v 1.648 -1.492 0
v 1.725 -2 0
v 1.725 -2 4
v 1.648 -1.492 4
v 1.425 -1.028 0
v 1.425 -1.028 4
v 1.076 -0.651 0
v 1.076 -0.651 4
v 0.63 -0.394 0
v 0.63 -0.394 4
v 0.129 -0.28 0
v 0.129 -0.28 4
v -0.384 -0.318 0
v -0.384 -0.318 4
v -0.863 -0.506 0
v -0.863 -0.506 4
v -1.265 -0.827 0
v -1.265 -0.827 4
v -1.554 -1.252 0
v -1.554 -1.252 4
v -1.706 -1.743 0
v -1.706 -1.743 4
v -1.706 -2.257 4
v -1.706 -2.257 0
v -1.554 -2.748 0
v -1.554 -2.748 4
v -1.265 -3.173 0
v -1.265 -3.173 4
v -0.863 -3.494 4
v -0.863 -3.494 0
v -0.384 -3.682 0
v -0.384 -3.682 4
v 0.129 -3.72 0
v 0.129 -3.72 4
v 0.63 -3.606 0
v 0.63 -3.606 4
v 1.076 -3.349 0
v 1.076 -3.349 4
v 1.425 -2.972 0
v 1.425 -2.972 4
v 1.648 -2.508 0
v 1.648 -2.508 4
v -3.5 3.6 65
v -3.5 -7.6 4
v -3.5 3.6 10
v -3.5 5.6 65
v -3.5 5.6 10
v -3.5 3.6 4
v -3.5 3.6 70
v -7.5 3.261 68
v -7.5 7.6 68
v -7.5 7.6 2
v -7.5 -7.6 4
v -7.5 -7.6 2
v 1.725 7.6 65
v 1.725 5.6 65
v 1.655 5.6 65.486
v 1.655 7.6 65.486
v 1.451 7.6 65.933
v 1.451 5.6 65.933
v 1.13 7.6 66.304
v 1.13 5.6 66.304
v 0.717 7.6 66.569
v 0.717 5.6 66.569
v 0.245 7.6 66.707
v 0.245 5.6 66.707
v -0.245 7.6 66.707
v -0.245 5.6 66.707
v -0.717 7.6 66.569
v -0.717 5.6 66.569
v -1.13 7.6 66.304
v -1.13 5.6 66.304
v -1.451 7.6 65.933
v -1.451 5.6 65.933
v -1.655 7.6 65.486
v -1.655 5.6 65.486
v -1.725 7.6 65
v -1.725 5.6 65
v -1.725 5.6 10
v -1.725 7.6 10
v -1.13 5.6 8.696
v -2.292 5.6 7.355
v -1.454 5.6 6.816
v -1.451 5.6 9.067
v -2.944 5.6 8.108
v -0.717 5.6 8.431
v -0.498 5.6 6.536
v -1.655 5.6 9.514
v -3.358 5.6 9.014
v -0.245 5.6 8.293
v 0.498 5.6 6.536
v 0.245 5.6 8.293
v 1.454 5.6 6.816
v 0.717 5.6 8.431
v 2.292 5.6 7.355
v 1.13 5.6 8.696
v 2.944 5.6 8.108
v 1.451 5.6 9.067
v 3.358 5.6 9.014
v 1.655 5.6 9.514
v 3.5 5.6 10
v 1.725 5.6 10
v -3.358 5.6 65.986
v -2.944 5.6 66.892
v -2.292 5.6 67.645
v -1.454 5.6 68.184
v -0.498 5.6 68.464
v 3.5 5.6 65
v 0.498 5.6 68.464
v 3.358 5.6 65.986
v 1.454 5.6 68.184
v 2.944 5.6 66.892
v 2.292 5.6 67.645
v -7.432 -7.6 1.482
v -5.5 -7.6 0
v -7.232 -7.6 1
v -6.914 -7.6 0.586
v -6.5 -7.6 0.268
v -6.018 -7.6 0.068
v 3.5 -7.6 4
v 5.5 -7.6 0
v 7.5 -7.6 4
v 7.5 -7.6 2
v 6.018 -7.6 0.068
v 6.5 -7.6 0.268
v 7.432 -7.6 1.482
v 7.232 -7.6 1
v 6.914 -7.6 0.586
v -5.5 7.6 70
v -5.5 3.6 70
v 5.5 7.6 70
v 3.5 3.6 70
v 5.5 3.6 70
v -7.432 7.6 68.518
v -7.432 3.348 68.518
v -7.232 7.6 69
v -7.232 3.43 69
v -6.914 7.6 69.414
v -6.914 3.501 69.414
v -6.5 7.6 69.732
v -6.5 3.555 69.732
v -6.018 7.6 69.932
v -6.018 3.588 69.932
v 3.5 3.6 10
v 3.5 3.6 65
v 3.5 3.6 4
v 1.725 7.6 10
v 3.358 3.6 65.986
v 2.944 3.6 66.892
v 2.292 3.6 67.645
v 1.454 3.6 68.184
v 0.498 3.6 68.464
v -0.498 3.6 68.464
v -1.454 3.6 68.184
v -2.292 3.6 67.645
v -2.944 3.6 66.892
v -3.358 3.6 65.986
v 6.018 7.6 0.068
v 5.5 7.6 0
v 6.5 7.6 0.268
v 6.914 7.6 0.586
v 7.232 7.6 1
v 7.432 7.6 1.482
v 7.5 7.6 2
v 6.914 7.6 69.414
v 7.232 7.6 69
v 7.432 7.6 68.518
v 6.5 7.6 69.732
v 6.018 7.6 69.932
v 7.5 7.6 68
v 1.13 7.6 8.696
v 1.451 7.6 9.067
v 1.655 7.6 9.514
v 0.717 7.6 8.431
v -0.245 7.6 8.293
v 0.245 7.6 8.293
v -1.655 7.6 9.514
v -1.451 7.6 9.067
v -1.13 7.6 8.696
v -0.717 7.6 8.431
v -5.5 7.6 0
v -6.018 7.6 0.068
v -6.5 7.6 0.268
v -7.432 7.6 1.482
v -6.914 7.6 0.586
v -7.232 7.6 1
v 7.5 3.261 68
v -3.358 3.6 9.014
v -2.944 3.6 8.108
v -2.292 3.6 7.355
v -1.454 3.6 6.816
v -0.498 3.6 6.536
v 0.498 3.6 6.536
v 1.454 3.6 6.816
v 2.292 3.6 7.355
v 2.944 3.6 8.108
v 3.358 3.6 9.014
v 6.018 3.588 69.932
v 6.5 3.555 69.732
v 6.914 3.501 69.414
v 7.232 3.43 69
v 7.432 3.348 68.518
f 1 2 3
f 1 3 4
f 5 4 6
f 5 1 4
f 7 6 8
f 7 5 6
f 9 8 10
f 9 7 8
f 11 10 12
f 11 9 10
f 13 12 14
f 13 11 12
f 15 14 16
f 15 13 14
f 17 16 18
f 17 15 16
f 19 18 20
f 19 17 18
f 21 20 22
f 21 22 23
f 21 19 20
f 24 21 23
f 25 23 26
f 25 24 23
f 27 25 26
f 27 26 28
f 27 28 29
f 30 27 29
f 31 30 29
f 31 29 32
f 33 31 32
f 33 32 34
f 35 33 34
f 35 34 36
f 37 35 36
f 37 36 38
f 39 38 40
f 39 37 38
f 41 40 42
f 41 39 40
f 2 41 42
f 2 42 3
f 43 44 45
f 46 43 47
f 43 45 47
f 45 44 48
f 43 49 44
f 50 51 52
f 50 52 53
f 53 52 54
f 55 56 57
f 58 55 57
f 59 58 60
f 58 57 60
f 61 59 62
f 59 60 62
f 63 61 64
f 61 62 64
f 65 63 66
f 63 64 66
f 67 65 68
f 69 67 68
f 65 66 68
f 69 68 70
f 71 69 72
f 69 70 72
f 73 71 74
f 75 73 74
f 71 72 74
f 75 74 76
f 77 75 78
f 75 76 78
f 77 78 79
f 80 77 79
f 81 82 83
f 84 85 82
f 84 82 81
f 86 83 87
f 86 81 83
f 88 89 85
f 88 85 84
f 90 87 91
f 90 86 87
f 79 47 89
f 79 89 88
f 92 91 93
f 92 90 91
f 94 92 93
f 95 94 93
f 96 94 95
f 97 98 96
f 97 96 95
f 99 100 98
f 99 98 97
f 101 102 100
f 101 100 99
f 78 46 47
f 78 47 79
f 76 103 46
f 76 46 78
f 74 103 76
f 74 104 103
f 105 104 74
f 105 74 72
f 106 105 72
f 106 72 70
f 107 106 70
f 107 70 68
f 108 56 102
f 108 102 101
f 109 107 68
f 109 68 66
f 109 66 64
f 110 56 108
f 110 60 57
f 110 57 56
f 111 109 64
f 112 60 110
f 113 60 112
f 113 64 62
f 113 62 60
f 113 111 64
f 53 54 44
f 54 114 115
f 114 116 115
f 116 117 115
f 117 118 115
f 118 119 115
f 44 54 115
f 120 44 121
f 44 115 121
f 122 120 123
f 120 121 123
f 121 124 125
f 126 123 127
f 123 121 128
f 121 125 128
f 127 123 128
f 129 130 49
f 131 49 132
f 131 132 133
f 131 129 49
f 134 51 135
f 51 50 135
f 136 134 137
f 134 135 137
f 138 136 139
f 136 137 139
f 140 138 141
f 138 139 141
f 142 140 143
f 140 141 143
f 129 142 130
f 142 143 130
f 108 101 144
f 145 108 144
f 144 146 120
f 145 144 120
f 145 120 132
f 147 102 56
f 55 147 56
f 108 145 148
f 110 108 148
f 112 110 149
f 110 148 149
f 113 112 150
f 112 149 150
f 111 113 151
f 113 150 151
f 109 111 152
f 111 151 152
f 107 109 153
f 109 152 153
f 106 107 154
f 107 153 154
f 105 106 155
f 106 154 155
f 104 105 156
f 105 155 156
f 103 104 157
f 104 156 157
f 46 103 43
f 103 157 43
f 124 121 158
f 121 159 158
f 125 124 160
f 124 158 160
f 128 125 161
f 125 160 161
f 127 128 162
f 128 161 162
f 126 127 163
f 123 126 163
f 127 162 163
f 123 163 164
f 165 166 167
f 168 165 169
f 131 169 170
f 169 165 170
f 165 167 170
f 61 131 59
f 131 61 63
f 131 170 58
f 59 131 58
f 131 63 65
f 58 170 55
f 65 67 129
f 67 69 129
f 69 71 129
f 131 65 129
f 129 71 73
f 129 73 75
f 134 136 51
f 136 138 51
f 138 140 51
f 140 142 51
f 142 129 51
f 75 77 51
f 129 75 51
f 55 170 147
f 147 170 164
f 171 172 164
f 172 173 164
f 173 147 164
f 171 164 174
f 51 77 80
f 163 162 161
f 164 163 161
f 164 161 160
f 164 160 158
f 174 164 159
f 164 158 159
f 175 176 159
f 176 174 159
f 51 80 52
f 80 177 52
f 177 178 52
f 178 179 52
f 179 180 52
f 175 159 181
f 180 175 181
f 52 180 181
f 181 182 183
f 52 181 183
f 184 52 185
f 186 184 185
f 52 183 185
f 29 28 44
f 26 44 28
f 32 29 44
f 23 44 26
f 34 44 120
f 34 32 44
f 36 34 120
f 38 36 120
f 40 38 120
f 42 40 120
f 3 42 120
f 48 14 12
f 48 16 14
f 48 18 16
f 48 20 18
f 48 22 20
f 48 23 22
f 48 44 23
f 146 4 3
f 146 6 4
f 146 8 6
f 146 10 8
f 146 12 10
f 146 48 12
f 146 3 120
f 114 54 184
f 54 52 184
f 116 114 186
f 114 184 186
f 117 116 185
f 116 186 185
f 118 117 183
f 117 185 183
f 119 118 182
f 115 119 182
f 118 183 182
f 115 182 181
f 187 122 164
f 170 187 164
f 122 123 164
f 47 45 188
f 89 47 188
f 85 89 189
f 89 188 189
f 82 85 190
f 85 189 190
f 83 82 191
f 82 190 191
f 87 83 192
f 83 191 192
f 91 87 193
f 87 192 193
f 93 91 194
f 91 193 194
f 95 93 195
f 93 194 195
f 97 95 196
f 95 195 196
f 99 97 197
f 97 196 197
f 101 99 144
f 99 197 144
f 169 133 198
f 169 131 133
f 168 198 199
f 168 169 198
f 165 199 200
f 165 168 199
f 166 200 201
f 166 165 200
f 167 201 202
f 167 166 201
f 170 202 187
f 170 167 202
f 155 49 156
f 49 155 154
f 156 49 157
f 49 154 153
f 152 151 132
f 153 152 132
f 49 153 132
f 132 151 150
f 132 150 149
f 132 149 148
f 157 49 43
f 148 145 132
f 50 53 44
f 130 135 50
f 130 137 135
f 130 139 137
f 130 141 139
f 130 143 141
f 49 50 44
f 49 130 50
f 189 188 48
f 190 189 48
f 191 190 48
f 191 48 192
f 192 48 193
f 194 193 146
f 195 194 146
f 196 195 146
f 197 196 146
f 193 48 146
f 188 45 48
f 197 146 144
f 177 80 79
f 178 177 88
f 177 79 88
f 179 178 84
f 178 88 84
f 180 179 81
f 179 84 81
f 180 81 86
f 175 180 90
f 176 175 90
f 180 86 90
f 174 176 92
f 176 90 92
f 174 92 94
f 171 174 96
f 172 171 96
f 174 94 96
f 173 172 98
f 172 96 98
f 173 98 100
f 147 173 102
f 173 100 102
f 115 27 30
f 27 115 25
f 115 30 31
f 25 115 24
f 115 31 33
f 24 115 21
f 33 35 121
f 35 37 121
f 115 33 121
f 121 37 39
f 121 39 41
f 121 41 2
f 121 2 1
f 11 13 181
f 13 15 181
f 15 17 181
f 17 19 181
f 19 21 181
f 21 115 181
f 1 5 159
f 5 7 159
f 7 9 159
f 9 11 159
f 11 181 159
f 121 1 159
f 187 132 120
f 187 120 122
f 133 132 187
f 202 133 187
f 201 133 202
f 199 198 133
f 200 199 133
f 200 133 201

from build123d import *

# Parameters (mm, degrees)
F0_W     = 15
F0_H     = 15.2
F0_R     = 1.725
F1_DEPTH = 4
F3_DEPTH = 66
F5_DEPTH = 2
F6_DEPTH = 4
F7_SIZE2 = 11.2
F7_SIZE  = 66
F8_R     = 2


with BuildPart() as f1:
    # F0 (on Top) → F1 (new body)
    with BuildSketch(Plane.XY):
        Rectangle(F0_W, F0_H)
        with Locations((0, -2)):
            Circle(F0_R, mode=Mode.SUBTRACT)
    extrude(amount=F1_DEPTH)

    # F2 (on face) → F3 (join)
    with BuildSketch(Plane.XY.offset(4)):
        Polygon((-7.5, 7.6), (-7.5, -7.6), (-3.5, -7.6), (-3.5, -2), (-3.5, 3.6), (3.5, 3.6), (3.5, -2), (3.5, -7.6), (7.5, -7.6), (7.5, 7.6), align=None)
    extrude(amount=F3_DEPTH)

    # F4 (on face) → F5 (cut)
    with BuildSketch(Plane.XZ.offset(-3.6)):
        with BuildLine():
            Line((-1.725, 13.045385854), (-1.725, 61.954614146))
            ThreePointArc((-1.725, 61.954614146), (-3.0238634228, 63.2375443268), (-3.5, 65))
            Line((-3.5, 65), (-3.5, 10.0000000135))
            ThreePointArc((-3.5, 10.0000000135), (-3.0238634194, 11.762455679), (-1.725, 13.045385854))
        make_face()
        with BuildLine():
            ThreePointArc((3.5, 65), (3.0238634228, 63.2375443268), (1.725, 61.954614146))
            Line((1.725, 61.954614146), (1.725, 13.045385854))
            ThreePointArc((1.725, 13.045385854), (3.0238634228, 11.7624556732), (3.5, 10))
            Line((3.5, 10), (3.5, 65))
        make_face()
        with BuildLine():
            ThreePointArc((-1.725, 65), (0, 66.725), (1.725, 65))
            Line((1.725, 65), (1.725, 61.954614146))
            ThreePointArc((1.725, 61.954614146), (3.0238634228, 63.2375443268), (3.5, 65))
            ThreePointArc((3.5, 65), (0, 68.5), (-3.5, 65))
            ThreePointArc((-3.5, 65), (-3.0238634228, 63.2375443268), (-1.725, 61.954614146))
            Line((-1.725, 61.954614146), (-1.725, 65))
        make_face()
        with BuildLine():
            ThreePointArc((3.5, 10), (3.0238634228, 11.7624556732), (1.725, 13.045385854))
            Line((1.725, 13.045385854), (1.725, 10))
            ThreePointArc((1.725, 10), (0, 8.275), (-1.725, 10))
            Line((-1.725, 10), (-1.725, 13.045385854))
            ThreePointArc((-1.725, 13.045385854), (-3.0238634194, 11.762455679), (-3.5, 10.0000000135))
            ThreePointArc((-3.5, 10.0000000135), (-6.7e-09, 6.5), (3.5, 10))
        make_face()
    extrude(amount=-F5_DEPTH, mode=Mode.SUBTRACT)

    # F4 (on face) → F6 (cut, through all)
    with BuildSketch(Plane.XZ.offset(-3.6)):
        with BuildLine():
            ThreePointArc((-1.725, 65), (0, 63.275), (1.725, 65))
            ThreePointArc((1.725, 65), (0, 66.725), (-1.725, 65))
        make_face()
        with BuildLine():
            Line((1.725, 61.954614146), (1.725, 65))
            ThreePointArc((1.725, 65), (0, 63.275), (-1.725, 65))
            Line((-1.725, 65), (-1.725, 61.954614146))
            ThreePointArc((-1.725, 61.954614146), (0, 61.5), (1.725, 61.954614146))
        make_face()
        with BuildLine():
            Line((1.725, 13.045385854), (1.725, 61.954614146))
            ThreePointArc((1.725, 61.954614146), (0, 61.5), (-1.725, 61.954614146))
            Line((-1.725, 61.954614146), (-1.725, 13.045385854))
            ThreePointArc((-1.725, 13.045385854), (0, 13.5), (1.725, 13.045385854))
        make_face()
        with BuildLine():
            Line((1.725, 10), (1.725, 13.045385854))
            ThreePointArc((1.725, 13.045385854), (0, 13.5), (-1.725, 13.045385854))
            Line((-1.725, 13.045385854), (-1.725, 10))
            ThreePointArc((-1.725, 10), (0, 11.725), (1.725, 10))
        make_face()
        with BuildLine():
            ThreePointArc((-1.725, 10), (0, 8.275), (1.725, 10))
            ThreePointArc((1.725, 10), (0, 11.725), (-1.725, 10))
        make_face()
    extrude(amount=-F6_DEPTH, mode=Mode.SUBTRACT)

    # F7
    f7_edges = [f1.edges().sort_by_distance(p)[0] for p in [
        (5.5, -7.6, 70),
        (-5.5, -7.6, 70),
    ]]
    f7_side = f1.faces().sort_by_distance((-6.784109, -7.6, 35))[0]
    chamfer(f7_edges, length=F7_SIZE, length2=F7_SIZE2, reference=f7_side)

    # F8
    f8_edges = [f1.edges().sort_by_distance(p)[0] for p in [
        (-7.5, 5.6, 70),
        (7.5, 5.6, 70),
        (-7.5, 0, 0),
        (7.5, 0, 0),
    ]]
    fillet(f8_edges, radius=F8_R)


solid = f1.part
